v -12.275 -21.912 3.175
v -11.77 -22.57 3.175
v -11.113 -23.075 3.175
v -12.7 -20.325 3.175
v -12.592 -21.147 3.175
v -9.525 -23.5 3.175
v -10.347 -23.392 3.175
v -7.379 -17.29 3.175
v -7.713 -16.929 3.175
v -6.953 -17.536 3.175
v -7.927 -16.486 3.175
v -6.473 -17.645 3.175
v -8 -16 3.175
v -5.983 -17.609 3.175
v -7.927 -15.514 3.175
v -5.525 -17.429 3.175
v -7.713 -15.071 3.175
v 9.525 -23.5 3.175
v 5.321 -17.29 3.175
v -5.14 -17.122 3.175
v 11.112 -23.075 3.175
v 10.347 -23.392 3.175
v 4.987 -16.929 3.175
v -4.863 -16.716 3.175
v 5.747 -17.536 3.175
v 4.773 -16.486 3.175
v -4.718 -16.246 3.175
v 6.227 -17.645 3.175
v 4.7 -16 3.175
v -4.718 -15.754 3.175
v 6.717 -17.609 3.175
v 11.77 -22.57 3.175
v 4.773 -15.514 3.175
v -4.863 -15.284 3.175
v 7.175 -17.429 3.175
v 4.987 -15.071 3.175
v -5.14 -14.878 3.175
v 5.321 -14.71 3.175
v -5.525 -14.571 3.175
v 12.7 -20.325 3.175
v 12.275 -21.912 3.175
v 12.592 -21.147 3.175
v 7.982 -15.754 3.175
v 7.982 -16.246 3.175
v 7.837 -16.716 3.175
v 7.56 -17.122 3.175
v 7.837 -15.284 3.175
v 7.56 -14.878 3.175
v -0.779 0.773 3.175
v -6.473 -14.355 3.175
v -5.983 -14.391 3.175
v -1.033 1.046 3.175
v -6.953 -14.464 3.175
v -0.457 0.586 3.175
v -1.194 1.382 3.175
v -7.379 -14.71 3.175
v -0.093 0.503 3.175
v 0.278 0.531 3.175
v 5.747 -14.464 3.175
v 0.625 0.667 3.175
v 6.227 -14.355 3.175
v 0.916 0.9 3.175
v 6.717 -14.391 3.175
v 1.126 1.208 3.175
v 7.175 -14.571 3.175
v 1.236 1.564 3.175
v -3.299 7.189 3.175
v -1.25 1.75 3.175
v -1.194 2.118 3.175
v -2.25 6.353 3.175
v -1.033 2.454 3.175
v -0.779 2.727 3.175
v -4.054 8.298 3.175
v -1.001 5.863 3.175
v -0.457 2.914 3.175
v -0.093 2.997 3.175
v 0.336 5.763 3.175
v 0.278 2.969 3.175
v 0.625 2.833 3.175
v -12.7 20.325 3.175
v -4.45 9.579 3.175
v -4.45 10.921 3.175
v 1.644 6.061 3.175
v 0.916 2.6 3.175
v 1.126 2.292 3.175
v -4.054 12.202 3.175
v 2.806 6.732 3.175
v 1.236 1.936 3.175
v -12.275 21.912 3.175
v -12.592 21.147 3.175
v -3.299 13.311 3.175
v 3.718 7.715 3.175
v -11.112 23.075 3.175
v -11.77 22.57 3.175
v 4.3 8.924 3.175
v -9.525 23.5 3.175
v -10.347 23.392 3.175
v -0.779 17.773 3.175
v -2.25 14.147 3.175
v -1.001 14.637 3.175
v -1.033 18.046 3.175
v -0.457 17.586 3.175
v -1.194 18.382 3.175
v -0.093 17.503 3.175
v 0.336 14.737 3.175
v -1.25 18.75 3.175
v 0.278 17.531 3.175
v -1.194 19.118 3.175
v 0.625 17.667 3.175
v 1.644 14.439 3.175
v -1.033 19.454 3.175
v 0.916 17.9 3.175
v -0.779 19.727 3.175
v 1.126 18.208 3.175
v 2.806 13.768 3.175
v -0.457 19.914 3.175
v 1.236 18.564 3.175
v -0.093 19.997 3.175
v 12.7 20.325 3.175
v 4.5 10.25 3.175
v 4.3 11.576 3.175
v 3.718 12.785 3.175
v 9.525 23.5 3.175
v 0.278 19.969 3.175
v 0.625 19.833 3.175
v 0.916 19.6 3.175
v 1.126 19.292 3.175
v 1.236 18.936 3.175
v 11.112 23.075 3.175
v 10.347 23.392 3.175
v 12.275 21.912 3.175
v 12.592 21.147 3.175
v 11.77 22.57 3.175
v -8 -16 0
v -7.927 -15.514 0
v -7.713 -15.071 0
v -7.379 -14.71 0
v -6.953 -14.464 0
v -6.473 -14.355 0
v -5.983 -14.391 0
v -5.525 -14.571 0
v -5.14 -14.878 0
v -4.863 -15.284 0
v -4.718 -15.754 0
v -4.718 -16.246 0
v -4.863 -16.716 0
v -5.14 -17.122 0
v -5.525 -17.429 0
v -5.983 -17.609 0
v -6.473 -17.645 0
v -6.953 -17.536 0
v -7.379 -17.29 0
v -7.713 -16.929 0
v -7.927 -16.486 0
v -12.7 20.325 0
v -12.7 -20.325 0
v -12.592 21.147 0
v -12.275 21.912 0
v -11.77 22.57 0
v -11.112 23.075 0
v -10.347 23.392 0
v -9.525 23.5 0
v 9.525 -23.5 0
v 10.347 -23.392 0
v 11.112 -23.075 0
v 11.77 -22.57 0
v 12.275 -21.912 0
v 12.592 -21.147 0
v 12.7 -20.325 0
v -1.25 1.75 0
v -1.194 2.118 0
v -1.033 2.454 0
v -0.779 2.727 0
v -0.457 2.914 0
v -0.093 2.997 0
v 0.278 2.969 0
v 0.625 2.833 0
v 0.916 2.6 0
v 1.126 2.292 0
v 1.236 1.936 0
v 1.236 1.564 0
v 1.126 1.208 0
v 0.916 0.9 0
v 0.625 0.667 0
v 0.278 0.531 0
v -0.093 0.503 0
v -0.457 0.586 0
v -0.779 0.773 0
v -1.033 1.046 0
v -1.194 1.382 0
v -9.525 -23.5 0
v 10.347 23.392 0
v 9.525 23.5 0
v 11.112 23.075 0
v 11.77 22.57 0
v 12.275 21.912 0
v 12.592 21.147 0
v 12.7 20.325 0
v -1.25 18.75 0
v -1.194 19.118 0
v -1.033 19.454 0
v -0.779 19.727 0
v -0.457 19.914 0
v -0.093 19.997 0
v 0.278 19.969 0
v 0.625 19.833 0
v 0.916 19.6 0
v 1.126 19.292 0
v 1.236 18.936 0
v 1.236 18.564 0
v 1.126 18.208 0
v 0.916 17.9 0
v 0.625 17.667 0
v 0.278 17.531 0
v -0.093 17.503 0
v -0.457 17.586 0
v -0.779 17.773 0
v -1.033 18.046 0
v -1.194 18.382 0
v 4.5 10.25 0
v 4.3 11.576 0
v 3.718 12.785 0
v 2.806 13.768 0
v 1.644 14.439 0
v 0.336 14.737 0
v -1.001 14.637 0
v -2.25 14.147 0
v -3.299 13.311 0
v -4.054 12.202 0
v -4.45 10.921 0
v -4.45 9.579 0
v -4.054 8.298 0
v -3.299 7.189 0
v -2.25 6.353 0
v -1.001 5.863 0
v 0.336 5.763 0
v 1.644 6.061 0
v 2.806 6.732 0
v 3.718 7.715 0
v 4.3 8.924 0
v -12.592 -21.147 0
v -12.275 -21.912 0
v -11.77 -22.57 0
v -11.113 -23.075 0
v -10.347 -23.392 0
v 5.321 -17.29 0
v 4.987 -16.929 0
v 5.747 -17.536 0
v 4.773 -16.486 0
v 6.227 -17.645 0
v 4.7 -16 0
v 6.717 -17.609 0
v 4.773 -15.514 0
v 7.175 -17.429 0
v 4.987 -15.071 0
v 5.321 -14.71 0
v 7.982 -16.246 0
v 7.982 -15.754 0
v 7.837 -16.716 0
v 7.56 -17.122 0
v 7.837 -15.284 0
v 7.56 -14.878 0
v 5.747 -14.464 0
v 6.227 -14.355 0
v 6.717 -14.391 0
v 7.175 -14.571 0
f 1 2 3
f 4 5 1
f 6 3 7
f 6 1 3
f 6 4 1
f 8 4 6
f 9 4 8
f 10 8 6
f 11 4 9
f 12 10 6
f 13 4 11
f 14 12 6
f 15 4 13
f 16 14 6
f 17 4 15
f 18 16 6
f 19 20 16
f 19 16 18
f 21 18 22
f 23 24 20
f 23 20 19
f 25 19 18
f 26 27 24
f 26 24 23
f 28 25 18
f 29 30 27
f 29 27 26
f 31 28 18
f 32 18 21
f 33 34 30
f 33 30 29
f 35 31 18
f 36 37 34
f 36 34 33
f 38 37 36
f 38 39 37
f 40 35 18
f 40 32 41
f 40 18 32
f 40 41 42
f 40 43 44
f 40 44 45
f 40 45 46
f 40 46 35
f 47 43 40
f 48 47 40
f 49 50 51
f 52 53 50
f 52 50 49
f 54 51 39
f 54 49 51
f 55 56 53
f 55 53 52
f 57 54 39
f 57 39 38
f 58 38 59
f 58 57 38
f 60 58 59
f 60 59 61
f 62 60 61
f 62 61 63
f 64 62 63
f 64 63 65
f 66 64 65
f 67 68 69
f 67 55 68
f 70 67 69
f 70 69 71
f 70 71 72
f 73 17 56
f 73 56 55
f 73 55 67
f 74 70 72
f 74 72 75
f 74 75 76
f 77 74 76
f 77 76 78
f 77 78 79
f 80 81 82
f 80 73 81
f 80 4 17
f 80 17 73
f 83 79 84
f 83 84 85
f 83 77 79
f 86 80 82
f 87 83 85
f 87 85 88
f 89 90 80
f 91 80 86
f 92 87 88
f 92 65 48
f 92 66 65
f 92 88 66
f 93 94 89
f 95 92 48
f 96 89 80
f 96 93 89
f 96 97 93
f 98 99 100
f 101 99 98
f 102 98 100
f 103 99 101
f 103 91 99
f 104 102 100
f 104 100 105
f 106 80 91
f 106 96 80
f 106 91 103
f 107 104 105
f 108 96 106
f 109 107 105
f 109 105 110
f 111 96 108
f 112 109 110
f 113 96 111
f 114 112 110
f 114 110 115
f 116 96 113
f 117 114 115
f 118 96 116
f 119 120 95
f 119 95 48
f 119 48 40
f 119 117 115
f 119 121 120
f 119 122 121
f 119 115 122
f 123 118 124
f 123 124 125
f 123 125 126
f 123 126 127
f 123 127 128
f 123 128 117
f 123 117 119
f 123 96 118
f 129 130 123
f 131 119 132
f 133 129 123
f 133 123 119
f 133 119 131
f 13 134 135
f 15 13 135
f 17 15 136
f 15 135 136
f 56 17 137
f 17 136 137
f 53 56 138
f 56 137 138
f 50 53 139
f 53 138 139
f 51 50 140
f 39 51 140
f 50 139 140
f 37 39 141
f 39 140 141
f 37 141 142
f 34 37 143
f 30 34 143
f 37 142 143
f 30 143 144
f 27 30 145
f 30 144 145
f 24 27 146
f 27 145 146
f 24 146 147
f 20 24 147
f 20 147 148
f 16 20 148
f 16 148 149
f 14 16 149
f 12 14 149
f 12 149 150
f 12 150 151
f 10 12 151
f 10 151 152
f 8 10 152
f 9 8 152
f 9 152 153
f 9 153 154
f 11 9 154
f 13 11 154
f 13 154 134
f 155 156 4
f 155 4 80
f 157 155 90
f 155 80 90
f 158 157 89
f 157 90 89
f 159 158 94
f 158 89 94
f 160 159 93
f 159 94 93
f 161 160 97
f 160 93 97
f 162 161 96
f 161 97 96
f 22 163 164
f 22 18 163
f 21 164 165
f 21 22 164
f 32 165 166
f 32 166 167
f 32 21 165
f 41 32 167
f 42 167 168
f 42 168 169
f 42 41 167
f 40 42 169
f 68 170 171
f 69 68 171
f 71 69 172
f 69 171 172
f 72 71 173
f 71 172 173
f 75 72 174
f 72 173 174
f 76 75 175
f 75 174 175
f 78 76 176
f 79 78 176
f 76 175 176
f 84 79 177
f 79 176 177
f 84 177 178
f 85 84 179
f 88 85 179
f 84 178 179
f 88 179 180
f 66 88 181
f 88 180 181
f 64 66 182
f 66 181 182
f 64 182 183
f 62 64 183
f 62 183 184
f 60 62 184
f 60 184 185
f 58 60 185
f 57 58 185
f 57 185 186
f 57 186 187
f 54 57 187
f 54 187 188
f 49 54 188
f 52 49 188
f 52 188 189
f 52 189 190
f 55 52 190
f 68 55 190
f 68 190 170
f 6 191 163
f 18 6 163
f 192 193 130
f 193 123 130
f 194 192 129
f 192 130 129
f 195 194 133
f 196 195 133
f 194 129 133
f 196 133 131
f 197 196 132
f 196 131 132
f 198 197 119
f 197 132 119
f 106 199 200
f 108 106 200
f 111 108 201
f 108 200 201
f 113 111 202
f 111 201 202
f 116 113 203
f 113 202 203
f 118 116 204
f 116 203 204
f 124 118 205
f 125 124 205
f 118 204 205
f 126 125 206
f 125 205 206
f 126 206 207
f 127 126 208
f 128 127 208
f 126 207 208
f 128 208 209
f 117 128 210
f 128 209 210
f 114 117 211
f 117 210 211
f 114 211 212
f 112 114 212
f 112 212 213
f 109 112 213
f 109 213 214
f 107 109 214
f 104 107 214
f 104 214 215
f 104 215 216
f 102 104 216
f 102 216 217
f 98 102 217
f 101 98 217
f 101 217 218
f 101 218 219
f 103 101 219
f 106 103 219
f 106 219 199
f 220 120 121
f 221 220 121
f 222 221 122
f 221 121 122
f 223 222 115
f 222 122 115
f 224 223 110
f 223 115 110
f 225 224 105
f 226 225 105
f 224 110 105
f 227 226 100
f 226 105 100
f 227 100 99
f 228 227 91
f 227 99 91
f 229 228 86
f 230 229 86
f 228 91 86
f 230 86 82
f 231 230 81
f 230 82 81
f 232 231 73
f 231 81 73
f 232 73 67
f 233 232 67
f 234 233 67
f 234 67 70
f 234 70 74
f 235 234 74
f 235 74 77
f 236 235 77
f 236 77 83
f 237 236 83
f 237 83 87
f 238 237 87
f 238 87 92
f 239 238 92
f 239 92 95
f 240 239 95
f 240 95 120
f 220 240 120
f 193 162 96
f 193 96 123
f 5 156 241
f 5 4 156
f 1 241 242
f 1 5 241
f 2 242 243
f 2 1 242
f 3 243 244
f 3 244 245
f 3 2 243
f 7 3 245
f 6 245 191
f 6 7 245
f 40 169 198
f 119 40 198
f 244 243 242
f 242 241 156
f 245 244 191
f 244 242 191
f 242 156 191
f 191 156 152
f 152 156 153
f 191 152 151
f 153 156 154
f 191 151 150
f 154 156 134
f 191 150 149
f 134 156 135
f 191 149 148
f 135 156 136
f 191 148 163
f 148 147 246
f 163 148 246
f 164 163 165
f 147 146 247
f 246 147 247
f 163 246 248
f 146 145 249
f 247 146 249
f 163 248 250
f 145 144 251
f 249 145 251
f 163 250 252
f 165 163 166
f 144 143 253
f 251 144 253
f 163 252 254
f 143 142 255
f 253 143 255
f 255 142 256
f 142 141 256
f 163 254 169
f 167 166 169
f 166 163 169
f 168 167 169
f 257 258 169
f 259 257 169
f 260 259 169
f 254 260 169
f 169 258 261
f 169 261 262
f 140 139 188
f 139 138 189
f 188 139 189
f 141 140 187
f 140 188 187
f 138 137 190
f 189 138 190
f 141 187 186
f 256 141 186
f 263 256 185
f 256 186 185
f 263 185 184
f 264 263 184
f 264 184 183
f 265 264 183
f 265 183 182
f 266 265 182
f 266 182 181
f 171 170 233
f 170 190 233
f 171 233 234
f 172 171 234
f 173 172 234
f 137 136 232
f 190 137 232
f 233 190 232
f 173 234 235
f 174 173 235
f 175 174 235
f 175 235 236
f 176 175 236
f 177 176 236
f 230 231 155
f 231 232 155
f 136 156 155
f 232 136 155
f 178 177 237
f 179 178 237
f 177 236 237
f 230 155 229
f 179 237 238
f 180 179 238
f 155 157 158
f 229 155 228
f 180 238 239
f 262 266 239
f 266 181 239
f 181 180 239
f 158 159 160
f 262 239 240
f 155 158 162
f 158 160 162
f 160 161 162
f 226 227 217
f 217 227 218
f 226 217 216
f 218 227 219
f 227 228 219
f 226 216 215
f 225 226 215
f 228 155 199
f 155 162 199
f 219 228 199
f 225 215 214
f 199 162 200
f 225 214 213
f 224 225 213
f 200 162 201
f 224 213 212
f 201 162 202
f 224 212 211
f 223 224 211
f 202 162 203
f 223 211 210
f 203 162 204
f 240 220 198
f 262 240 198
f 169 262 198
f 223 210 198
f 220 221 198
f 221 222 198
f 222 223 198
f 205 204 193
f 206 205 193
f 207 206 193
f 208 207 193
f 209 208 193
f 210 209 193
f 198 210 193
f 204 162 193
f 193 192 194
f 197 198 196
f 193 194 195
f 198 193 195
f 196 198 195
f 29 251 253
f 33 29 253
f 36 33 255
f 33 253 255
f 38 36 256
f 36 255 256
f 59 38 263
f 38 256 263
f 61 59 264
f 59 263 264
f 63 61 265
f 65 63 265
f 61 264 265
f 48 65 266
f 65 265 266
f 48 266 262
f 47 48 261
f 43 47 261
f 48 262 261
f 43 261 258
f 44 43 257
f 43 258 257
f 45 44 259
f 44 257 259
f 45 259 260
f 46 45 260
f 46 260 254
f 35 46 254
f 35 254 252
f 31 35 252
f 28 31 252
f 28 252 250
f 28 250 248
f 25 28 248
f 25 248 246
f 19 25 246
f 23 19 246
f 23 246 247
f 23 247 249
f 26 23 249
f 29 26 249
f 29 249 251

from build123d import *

# Parameters (mm, degrees)
SKETCH1_W             = 25.4
SKETCH1_H             = 47
BOSS_EXTRUDE1_DEPTH   = 3.175
SKETCH2_R             = 4.5
CUT_EXTRUDE1_DEPTH    = 27.90019749
M3X0_5_TAPPED_HOLE1_D = 2.5
FILLET1_R             = 3.175
M4X0_7_TAPPED_HOLE1_D = 3.3


with BuildPart() as part:
    # Sketch1 → Boss-Extrude1 (new body)
    with BuildSketch(Plane.XY):
        Rectangle(SKETCH1_W, SKETCH1_H)
    extrude(amount=BOSS_EXTRUDE1_DEPTH)

    # Sketch2 → Cut-Extrude1 (cut, through all)
    with BuildSketch(Plane.XY.offset(3.175)):
        with Locations((0, 10.25)):
            Circle(SKETCH2_R)
    extrude(amount=-CUT_EXTRUDE1_DEPTH, mode=Mode.SUBTRACT)

    # M3x0.5 Tapped Hole1 (through all)
    with Locations(Plane.XY.offset(3.175)):
        with Locations((0, 18.75), (0, 1.75)):
            Hole(M3X0_5_TAPPED_HOLE1_D / 2)

    # Fillet1
    fillet1_edges = [part.edges().sort_by_distance(p)[0] for p in [
        (12.7, -23.5, 1.5875),
        (-12.7, -23.5, 1.5875),
        (-12.7, 23.5, 1.5875),
        (12.7, 23.5, 1.5875),
    ]]
    fillet(fillet1_edges, radius=FILLET1_R)

    # M4x0.7 Tapped Hole1 (through all)
    with Locations(Plane.XY.offset(3.175)):
        with Locations((-6.35, -16), (6.35, -16)):
            Hole(M4X0_7_TAPPED_HOLE1_D / 2)


solid = part.part
